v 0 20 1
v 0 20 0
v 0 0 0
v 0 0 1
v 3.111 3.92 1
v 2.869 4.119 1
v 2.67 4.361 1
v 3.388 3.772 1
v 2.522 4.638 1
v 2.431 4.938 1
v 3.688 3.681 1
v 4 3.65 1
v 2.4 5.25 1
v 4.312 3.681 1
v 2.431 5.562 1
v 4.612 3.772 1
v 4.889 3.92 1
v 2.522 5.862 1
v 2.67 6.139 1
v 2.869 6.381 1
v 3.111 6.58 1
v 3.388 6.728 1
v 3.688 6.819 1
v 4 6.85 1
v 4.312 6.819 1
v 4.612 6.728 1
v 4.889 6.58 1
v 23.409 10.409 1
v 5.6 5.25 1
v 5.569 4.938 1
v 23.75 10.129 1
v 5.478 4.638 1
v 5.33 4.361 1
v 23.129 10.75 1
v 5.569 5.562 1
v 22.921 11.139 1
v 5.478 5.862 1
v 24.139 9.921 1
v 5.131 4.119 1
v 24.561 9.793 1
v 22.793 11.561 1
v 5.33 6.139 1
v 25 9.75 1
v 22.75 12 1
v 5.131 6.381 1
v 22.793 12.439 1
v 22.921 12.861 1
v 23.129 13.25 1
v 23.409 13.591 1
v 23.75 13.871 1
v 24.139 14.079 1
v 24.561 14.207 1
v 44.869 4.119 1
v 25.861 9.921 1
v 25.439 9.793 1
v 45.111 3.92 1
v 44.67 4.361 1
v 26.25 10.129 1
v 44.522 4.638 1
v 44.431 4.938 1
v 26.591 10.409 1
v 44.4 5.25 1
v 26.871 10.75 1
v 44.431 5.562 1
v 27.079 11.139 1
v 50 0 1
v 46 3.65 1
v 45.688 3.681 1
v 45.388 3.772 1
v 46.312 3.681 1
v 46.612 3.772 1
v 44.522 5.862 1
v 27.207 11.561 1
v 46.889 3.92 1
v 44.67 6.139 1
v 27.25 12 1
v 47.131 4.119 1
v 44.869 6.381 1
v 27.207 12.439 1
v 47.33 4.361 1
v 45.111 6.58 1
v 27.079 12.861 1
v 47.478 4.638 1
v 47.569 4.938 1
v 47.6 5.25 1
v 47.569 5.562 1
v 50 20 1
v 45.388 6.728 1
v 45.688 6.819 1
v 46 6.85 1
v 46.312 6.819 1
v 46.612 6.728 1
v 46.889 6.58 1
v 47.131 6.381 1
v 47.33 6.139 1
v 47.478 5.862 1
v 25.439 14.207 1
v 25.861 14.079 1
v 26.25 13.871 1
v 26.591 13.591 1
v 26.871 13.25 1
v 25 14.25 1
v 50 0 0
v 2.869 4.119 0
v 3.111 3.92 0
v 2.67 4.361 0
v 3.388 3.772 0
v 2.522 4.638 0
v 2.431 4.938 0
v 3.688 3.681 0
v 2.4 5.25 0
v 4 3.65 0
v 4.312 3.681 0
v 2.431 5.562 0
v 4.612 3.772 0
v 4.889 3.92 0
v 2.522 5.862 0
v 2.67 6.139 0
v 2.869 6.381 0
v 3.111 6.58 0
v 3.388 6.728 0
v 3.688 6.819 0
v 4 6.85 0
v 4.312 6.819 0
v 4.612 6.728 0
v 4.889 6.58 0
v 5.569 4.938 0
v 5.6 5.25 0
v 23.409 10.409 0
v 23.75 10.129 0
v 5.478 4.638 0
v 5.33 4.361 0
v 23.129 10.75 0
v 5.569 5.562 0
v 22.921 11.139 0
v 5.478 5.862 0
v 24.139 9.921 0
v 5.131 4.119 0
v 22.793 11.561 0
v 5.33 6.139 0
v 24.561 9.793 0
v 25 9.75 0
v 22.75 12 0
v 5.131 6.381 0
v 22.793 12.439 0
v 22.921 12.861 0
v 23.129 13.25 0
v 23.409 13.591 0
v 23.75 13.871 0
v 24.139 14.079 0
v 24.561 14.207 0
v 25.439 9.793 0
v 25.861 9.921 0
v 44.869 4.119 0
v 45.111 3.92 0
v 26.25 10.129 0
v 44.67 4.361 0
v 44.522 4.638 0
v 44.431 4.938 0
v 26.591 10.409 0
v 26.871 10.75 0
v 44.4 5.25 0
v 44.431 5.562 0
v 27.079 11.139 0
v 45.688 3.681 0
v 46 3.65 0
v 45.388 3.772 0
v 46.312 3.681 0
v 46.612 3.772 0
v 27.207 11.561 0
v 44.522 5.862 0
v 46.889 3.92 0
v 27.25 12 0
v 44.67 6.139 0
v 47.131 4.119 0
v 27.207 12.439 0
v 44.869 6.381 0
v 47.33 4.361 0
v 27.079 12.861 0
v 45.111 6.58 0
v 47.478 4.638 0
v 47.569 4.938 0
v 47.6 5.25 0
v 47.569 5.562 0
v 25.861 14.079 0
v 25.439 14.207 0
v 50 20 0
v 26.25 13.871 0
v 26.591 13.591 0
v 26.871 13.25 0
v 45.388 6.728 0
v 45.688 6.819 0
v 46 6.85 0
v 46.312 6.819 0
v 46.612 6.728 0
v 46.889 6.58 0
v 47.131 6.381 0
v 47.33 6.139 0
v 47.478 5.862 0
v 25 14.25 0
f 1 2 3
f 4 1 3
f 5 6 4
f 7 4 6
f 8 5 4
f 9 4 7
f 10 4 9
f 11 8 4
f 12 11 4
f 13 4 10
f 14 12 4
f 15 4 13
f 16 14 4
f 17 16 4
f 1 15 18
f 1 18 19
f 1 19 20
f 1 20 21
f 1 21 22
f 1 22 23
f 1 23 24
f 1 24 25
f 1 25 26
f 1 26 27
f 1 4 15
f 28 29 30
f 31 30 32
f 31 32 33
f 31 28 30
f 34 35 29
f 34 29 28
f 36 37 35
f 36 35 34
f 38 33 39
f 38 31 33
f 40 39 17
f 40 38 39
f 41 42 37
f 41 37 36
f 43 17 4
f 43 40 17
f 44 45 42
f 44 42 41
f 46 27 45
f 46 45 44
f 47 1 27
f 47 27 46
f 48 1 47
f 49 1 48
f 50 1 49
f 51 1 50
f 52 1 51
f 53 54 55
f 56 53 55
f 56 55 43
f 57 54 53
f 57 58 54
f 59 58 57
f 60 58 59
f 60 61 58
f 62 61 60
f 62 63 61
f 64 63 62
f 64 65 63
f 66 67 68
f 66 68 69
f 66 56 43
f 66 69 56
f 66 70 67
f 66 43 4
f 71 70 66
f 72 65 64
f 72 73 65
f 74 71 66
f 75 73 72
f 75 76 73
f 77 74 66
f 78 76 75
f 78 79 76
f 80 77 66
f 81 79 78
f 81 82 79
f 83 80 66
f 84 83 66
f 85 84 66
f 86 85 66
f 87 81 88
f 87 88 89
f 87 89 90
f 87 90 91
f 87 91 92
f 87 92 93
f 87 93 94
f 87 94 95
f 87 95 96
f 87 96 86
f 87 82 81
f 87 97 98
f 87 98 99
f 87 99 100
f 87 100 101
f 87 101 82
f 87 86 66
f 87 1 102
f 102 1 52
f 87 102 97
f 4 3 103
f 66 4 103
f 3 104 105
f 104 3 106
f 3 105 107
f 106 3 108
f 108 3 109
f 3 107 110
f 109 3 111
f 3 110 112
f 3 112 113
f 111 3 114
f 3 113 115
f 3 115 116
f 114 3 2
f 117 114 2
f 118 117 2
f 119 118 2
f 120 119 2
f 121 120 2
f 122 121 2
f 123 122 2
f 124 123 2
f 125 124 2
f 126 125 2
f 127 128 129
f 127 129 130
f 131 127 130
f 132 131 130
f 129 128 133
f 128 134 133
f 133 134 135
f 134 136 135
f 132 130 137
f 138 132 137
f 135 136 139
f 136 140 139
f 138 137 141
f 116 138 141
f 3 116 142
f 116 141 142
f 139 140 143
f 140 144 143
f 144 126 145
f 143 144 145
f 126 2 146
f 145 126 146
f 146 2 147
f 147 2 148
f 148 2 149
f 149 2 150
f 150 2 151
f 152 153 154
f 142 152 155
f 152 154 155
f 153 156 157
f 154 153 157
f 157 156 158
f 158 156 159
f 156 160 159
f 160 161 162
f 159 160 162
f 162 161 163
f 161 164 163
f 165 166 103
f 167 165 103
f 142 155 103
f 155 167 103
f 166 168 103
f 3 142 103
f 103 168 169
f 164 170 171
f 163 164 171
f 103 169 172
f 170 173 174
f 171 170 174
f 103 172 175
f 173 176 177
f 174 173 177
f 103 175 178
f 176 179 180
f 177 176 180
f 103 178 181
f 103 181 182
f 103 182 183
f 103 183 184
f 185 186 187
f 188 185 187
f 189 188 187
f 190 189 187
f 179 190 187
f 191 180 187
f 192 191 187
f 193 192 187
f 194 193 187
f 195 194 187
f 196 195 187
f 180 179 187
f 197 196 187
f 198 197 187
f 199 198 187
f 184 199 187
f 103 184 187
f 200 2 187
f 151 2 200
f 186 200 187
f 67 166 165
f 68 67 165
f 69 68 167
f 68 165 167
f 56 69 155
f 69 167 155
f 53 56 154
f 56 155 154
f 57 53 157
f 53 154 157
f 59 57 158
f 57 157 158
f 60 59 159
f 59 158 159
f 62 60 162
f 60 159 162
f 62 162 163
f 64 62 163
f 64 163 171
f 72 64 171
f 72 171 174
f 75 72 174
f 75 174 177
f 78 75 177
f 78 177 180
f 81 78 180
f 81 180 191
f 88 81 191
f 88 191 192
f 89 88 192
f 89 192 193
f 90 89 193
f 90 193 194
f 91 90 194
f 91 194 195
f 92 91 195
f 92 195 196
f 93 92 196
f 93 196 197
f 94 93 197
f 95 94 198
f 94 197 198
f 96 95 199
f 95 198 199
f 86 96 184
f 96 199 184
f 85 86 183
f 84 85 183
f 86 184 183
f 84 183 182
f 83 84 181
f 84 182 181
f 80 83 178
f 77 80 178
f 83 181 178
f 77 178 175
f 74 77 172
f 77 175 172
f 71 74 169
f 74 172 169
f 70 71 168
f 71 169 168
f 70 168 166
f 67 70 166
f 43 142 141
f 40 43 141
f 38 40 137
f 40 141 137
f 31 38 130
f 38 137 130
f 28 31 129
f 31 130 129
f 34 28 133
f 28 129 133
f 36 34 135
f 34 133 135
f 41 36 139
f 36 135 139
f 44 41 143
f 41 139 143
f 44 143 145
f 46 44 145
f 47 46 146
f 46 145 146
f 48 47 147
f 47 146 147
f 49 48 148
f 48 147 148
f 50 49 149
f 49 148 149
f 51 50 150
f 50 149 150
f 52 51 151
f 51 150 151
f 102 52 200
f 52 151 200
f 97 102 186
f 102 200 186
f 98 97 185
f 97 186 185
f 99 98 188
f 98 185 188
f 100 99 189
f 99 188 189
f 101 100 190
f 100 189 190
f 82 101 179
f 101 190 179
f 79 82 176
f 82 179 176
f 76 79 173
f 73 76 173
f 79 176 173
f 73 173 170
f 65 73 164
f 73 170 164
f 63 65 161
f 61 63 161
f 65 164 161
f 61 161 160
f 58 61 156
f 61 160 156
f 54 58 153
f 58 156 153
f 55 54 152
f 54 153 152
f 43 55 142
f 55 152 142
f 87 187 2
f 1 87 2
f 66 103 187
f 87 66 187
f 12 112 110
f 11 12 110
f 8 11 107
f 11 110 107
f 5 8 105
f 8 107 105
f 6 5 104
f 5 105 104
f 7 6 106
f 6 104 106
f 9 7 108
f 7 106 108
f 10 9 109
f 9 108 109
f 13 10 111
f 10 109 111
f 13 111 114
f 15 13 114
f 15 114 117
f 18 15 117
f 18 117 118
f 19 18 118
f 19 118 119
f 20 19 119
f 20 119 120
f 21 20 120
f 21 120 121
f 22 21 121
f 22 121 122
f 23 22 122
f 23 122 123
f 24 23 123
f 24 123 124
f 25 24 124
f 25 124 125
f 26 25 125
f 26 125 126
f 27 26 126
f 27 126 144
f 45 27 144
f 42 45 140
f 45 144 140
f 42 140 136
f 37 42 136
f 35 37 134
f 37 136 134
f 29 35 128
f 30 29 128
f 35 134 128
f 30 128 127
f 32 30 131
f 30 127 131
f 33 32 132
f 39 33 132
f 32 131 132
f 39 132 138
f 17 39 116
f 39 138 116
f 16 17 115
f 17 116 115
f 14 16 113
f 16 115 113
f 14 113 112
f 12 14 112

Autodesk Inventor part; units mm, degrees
ref_plane "YZ Plane" through (0, 0, 0) normal (1, 0, 0) x (0, 1, 0)
ref_plane "XZ Plane" through (0, 0, 0) normal (0, 1, 0) x (-1, 0, 0)
ref_plane "XY Plane" through (0, 0, 0) normal (0, 0, 1) x (1, 0, 0)
sketch "スケッチ1" plane through (0, 0, 0) normal (0, 0, 1) x (1, 0, 0)
  line L0 (0, 0) -> (50, 0)
  line L1 (50, 0) -> (50, 20)
  line L2 (50, 20) -> (0, 20)
  line L3 (0, 20) -> (0, 0)
  dimension "d0" = 20
  dimension "d1" = 50
extrude "押し出し1" add sketch "スケッチ1" along normal blind 1
sketch "スケッチ2" plane through (0, 0, 1) normal (0, 0, 1) x (1, 0, 0)
  line L0 (50, 20) -> (0, 20) projected
  point P0 (0, 0)
  point P1 (25, 12)
  point P2 (25, 20)
  dimension "d4" = 8
hole "穴1" at (25, 12, 1) direction (0, 0, -1) diameter 4.5 end through all
sketch "スケッチ3" plane through (0, 0, 1) normal (0, 0, 1) x (1, 0, 0)
  line L0 (0, 20) -> (0, 0) projected
  line L1 (0, 0) -> (50, 0) projected
  line L2 (50, 20) -> (0, 20) projected
  point P0 (4, 5.25)
  point P1 (46, 5.25)
  dimension "d12" = 42
  dimension "d13" = 4
  dimension "d22" = 14.75
hole "穴2" at (4, 5.25, 1) at (46, 5.25, 1) direction (0, 0, -1) diameter 3.2 end through all
properties part number "CLS_typeC_31.4N_plate"
